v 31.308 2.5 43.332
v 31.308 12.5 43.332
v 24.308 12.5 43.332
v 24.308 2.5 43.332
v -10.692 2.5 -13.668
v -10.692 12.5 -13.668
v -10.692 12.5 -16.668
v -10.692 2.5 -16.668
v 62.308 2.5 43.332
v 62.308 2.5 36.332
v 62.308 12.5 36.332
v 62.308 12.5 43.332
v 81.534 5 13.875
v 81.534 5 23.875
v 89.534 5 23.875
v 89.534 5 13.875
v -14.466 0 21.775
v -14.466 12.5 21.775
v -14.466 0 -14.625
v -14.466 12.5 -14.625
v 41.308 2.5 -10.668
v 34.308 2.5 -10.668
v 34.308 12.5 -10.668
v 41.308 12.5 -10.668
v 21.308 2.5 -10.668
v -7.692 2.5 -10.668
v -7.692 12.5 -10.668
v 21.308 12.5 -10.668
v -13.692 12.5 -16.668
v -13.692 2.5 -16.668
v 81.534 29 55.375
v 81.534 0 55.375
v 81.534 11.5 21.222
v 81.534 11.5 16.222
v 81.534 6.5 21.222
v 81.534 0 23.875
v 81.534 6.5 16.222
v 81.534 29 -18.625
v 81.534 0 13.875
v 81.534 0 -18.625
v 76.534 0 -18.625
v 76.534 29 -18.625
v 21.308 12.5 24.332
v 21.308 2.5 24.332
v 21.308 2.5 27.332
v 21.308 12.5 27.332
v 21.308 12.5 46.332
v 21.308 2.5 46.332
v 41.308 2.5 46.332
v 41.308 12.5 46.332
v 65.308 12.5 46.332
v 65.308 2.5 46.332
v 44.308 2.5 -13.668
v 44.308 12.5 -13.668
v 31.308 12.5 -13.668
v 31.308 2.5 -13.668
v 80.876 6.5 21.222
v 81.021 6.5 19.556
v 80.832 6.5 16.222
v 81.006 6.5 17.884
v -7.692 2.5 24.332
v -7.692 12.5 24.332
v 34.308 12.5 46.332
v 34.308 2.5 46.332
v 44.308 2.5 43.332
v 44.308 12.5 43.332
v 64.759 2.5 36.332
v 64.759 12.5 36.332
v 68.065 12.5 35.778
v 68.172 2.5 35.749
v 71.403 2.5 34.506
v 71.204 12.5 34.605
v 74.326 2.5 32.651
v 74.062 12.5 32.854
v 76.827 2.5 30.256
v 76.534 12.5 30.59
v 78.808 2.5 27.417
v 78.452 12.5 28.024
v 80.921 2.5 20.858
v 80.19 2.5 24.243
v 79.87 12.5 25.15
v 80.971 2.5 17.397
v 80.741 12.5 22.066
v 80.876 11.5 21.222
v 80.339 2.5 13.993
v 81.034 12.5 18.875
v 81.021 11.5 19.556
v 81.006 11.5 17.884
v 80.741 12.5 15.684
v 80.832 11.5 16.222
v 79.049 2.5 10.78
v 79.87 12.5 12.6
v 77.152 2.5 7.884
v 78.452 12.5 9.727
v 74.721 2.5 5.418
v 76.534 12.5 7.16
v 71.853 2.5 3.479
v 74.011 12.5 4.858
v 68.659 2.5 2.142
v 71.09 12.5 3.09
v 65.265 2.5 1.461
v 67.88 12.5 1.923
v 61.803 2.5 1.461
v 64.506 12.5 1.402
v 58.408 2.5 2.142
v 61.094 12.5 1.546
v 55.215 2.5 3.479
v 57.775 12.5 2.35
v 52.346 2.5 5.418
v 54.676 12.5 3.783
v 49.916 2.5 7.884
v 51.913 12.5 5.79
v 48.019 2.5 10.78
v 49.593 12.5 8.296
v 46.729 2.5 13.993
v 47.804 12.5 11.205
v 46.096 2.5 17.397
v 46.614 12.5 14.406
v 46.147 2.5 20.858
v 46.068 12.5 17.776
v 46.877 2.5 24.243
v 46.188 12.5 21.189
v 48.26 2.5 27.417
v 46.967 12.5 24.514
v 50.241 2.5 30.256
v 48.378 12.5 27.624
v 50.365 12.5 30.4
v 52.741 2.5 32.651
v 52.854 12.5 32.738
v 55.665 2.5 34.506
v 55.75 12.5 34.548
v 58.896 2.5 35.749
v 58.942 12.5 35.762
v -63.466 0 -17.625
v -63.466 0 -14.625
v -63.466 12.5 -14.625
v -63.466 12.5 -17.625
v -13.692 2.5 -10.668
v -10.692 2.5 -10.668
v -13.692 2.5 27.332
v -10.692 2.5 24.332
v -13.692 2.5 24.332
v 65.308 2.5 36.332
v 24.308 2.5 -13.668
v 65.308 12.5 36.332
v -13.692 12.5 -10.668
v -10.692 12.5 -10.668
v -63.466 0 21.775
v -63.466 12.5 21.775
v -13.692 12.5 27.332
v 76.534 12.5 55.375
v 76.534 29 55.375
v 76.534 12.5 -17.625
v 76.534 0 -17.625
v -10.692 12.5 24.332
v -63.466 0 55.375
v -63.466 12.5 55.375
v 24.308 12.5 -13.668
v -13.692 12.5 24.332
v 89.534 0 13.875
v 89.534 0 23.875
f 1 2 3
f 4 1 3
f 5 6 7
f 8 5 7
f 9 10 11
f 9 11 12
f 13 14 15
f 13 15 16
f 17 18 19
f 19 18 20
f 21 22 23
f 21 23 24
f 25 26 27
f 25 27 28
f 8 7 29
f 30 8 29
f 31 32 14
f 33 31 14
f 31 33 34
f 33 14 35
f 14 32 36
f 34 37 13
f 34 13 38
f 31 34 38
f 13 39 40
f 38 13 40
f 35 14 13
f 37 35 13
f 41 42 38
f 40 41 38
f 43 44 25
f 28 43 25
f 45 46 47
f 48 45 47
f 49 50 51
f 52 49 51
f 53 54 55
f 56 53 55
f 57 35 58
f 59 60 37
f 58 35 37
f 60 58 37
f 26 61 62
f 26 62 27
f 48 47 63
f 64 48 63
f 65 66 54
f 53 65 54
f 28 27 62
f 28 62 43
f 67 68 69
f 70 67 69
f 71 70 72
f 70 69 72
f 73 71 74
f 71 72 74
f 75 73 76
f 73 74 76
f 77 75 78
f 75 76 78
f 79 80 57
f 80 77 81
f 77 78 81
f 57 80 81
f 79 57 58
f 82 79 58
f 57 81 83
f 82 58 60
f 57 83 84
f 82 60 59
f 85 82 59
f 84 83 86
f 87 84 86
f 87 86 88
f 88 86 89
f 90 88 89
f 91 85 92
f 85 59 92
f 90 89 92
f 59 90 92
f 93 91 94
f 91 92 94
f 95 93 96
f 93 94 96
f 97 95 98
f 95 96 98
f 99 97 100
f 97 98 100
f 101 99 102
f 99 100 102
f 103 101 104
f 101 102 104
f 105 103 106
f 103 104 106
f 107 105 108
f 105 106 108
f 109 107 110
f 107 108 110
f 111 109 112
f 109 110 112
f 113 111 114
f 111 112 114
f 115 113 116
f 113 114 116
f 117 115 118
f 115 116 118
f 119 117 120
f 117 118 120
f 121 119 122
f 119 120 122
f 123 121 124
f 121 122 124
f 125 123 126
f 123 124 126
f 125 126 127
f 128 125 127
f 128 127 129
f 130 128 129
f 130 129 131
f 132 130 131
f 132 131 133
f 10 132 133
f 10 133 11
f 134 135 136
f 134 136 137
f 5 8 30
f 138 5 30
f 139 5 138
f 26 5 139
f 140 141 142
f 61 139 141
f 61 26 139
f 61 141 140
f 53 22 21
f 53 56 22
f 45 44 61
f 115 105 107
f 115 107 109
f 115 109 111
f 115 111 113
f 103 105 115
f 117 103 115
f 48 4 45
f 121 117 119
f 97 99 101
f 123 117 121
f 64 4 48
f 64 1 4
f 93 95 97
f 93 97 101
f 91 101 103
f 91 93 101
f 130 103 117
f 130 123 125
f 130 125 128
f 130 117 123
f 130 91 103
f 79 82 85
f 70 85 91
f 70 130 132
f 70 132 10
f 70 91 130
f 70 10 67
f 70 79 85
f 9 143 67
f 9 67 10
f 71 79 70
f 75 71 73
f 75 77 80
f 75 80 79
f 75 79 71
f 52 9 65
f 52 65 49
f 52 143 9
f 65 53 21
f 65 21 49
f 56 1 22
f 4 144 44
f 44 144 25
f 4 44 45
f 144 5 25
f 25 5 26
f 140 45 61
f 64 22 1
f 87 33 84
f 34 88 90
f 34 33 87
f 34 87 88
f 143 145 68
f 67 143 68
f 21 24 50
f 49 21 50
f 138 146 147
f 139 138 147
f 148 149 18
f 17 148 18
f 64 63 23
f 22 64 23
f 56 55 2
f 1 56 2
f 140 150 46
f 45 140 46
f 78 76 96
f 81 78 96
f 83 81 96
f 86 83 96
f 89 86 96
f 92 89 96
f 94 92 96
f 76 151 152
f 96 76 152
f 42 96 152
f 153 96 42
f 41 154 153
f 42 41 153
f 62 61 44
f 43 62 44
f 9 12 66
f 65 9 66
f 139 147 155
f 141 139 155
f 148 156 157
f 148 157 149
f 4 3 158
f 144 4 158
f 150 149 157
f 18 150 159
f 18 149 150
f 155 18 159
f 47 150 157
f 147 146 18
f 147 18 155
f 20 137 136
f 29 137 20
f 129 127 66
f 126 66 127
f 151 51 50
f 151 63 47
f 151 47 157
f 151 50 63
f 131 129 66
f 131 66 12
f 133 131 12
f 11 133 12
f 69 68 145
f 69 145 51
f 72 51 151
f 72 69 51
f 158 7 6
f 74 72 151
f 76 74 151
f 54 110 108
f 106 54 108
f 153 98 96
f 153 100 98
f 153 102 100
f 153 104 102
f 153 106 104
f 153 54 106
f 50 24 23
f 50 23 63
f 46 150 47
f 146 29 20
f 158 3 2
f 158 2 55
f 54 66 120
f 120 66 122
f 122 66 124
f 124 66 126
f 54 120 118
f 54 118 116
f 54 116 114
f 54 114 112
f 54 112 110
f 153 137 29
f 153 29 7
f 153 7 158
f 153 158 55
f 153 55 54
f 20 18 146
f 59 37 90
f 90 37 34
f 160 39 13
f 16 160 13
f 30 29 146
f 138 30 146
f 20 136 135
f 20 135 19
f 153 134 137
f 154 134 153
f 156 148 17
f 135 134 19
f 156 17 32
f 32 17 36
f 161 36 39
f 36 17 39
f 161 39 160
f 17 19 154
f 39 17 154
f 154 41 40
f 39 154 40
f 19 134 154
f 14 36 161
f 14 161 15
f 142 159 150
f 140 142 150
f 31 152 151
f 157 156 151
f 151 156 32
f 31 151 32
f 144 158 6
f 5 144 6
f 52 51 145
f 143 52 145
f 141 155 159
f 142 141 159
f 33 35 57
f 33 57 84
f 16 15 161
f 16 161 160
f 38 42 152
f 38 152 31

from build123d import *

# Parameters (mm, degrees)
SKETCH1_W            = 145
SKETCH1_H            = 73
BOSS_EXTRUDE1_DEPTH  = 12.5
SKETCH2_R            = 17.5
CUT_EXTRUDE1_DEPTH   = 10
SKETCH3_W            = 5
SKETCH3_H            = 5
CUT_EXTRUDE2_DEPTH   = 10
SKETCH4_W            = 10
SKETCH4_H            = 5
BOSS_EXTRUDE2_DEPTH  = 8
SKETCH6_W            = 5
SKETCH6_H            = 73
BOSS_EXTRUDE3_DEPTH  = 15.5
SKETCH7_W            = 49
SKETCH7_H            = 36.4
CUT_EXTRUDE5_DEPTH   = 15.5
SKETCH8_W            = 29
SKETCH8_H            = 35
CUT_EXTRUDE7_DEPTH   = 10
SKETCH9_W            = 29
SKETCH9_H            = 35
BOSS_EXTRUDE4_DEPTH  = 10
SKETCH12_W           = 5
SKETCH12_H           = 1
BOSS_EXTRUDE17_DEPTH = 28
SKETCH13_W           = 5
SKETCH13_H           = 74
BOSS_EXTRUDE18_DEPTH = 1


with BuildPart() as part:
    # Sketch1 → Boss-Extrude1 (new body)
    with BuildSketch(Plane(origin=(0, 0, 0), x_dir=(1, 0, 0), z_dir=(0, 1, 0))):
        with Locations((9.033907784, -18.875048519)):
            Rectangle(SKETCH1_W, SKETCH1_H)
    extrude(amount=BOSS_EXTRUDE1_DEPTH)

    # Sketch2 → Cut-Extrude1 (cut)
    with BuildSketch(Plane(origin=(0, 12.5, 0), x_dir=(1, 0, 0), z_dir=(0, 1, 0))):
        with Locations(Location((63.533907784, -18.875048519, 0), (0, 0, 270))):
            Circle(SKETCH2_R)
    extrude(amount=-CUT_EXTRUDE1_DEPTH, mode=Mode.SUBTRACT)

    # Sketch3 → Cut-Extrude2 (cut)
    with BuildSketch(Plane(origin=(81.533907784, 0, 0), x_dir=(0, 0, -1), z_dir=(1, 0, 0))):
        with Locations((-18.721678118, 9)):
            Rectangle(SKETCH3_W, SKETCH3_H)
    extrude(amount=-CUT_EXTRUDE2_DEPTH, mode=Mode.SUBTRACT)

    # Sketch4 → Boss-Extrude2 (add)
    with BuildSketch(Plane(origin=(81.533907784, 0, 0), x_dir=(0, 0, -1), z_dir=(1, 0, 0))):
        with Locations((-18.875048519, 2.5)):
            Rectangle(SKETCH4_W, SKETCH4_H)
    extrude(amount=BOSS_EXTRUDE2_DEPTH)

    # Sketch6 → Boss-Extrude3 (add)
    with BuildSketch(Plane(origin=(0, 12.5, 0), x_dir=(1, 0, 0), z_dir=(0, 1, 0))):
        with Locations((79.033907784, -18.875048519)):
            Rectangle(SKETCH6_W, SKETCH6_H)
    extrude(amount=BOSS_EXTRUDE3_DEPTH)

    # Sketch7 → Cut-Extrude5 (cut)
    with BuildSketch(Plane(origin=(0, 12.5, 0), x_dir=(1, 0, 0), z_dir=(0, 1, 0))):
        with Locations((-38.966092216, -3.575048519)):
            Rectangle(SKETCH7_W, SKETCH7_H)
    extrude(amount=-CUT_EXTRUDE5_DEPTH, mode=Mode.SUBTRACT)

    # Sketch8 → Cut-Extrude7 (cut)
    # profile 1 of 2: a face of its own
    with BuildSketch(Plane(origin=(0, 12.5, 0), x_dir=(1, 0, 0), z_dir=(0, 1, 0))):
        with BuildLine():
            ThreePointArc((63.533907784, -36.375048519), (62.920825736, -36.364306091), (62.308496373, -36.332091994))
            Line((62.308496373, -36.332091994), (62.308496373, -43.332091994))
            Line((62.308496373, -43.332091994), (44.308496373, -43.332091994))
            Line((44.308496373, -43.332091994), (44.308496373, 13.667908006))
            Line((44.308496373, 13.667908006), (41.308496373, 13.667908006))
            Line((41.308496373, 13.667908006), (31.308496373, 13.667908006))
            Line((31.308496373, 13.667908006), (31.308496373, 10.667908006))
            Line((31.308496373, 10.667908006), (31.308496373, -43.332091994))
            Line((31.308496373, -43.332091994), (24.308496373, -43.332091994))
            Line((24.308496373, -43.332091994), (24.308496373, -27.332091994))
            Line((24.308496373, -27.332091994), (24.308496373, -24.332091994))
            Line((24.308496373, -24.332091994), (24.308496373, 13.667908006))
            Line((24.308496373, 13.667908006), (21.308496373, 13.667908006))
            Line((21.308496373, 13.667908006), (-7.691503627, 13.667908006))
            Line((-7.691503627, 13.667908006), (-10.691503627, 13.667908006))
            Line((-10.691503627, 13.667908006), (-10.691503627, 16.667908006))
            Line((-10.691503627, 16.667908006), (-13.691503627, 16.667908006))
            Line((-13.691503627, 16.667908006), (-13.691503627, 13.667908006))
            Line((-13.691503627, 13.667908006), (-13.691503627, 10.667908006))
            Line((-13.691503627, 10.667908006), (-10.691503627, 10.667908006))
            Line((-10.691503627, 10.667908006), (-10.691503627, -24.332091994))
            Line((-10.691503627, -24.332091994), (-13.691503627, -24.332091994))
            Line((-13.691503627, -24.332091994), (-13.691503627, -27.332091994))
            Line((-13.691503627, -27.332091994), (21.308496373, -27.332091994))
            Line((21.308496373, -27.332091994), (21.308496373, -43.332091994))
            Line((21.308496373, -43.332091994), (21.308496373, -46.332091994))
            Line((21.308496373, -46.332091994), (31.308496373, -46.332091994))
            Line((31.308496373, -46.332091994), (34.308496373, -46.332091994))
            Line((34.308496373, -46.332091994), (34.308496373, 10.667908006))
            Line((34.308496373, 10.667908006), (41.308496373, 10.667908006))
            Line((41.308496373, 10.667908006), (41.308496373, -43.332091994))
            Line((41.308496373, -43.332091994), (41.308496373, -46.332091994))
            Line((41.308496373, -46.332091994), (62.308496373, -46.332091994))
            Line((62.308496373, -46.332091994), (65.308496373, -46.332091994))
            Line((65.308496373, -46.332091994), (65.308496373, -36.332091994))
            Line((65.308496373, -36.332091994), (64.759319195, -36.332091994))
            ThreePointArc((64.759319195, -36.332091994), (64.146989832, -36.364306091), (63.533907784, -36.375048519))
        make_face()
        with Locations((6.808496373, -6.832091994)):
            Rectangle(SKETCH8_W, SKETCH8_H, mode=Mode.SUBTRACT)
    # profile 2 of 2: a face of its own
    with BuildSketch(Plane(origin=(0, 12.5, 0), x_dir=(1, 0, 0), z_dir=(0, 1, 0))):
        with Locations((6.808496373, -6.832091994)):
            Rectangle(SKETCH8_W, SKETCH8_H)
    extrude(amount=-CUT_EXTRUDE7_DEPTH, mode=Mode.SUBTRACT)

    # Sketch9 → Boss-Extrude4 (add)
    with BuildSketch(Plane(origin=(0, 2.5, 0), x_dir=(1, 0, 0), z_dir=(0, 1, 0))):
        with Locations((6.808496373, -6.832091994)):
            Rectangle(SKETCH9_W, SKETCH9_H)
    extrude(amount=BOSS_EXTRUDE4_DEPTH)

    # Sketch12 → Boss-Extrude17 (add)
    with BuildSketch(Plane(origin=(0, 28, 0), x_dir=(1, 0, 0), z_dir=(0, 1, 0))):
        with Locations((79.033907784, 18.124951481)):
            Rectangle(SKETCH12_W, SKETCH12_H)
    extrude(amount=-BOSS_EXTRUDE17_DEPTH)

    # Sketch13 → Boss-Extrude18 (add)
    with BuildSketch(Plane(origin=(0, 28, 0), x_dir=(1, 0, 0), z_dir=(0, 1, 0))):
        with Locations((79.033907784, -18.375048519)):
            Rectangle(SKETCH13_W, SKETCH13_H)
    extrude(amount=BOSS_EXTRUDE18_DEPTH)


solid = part.part
